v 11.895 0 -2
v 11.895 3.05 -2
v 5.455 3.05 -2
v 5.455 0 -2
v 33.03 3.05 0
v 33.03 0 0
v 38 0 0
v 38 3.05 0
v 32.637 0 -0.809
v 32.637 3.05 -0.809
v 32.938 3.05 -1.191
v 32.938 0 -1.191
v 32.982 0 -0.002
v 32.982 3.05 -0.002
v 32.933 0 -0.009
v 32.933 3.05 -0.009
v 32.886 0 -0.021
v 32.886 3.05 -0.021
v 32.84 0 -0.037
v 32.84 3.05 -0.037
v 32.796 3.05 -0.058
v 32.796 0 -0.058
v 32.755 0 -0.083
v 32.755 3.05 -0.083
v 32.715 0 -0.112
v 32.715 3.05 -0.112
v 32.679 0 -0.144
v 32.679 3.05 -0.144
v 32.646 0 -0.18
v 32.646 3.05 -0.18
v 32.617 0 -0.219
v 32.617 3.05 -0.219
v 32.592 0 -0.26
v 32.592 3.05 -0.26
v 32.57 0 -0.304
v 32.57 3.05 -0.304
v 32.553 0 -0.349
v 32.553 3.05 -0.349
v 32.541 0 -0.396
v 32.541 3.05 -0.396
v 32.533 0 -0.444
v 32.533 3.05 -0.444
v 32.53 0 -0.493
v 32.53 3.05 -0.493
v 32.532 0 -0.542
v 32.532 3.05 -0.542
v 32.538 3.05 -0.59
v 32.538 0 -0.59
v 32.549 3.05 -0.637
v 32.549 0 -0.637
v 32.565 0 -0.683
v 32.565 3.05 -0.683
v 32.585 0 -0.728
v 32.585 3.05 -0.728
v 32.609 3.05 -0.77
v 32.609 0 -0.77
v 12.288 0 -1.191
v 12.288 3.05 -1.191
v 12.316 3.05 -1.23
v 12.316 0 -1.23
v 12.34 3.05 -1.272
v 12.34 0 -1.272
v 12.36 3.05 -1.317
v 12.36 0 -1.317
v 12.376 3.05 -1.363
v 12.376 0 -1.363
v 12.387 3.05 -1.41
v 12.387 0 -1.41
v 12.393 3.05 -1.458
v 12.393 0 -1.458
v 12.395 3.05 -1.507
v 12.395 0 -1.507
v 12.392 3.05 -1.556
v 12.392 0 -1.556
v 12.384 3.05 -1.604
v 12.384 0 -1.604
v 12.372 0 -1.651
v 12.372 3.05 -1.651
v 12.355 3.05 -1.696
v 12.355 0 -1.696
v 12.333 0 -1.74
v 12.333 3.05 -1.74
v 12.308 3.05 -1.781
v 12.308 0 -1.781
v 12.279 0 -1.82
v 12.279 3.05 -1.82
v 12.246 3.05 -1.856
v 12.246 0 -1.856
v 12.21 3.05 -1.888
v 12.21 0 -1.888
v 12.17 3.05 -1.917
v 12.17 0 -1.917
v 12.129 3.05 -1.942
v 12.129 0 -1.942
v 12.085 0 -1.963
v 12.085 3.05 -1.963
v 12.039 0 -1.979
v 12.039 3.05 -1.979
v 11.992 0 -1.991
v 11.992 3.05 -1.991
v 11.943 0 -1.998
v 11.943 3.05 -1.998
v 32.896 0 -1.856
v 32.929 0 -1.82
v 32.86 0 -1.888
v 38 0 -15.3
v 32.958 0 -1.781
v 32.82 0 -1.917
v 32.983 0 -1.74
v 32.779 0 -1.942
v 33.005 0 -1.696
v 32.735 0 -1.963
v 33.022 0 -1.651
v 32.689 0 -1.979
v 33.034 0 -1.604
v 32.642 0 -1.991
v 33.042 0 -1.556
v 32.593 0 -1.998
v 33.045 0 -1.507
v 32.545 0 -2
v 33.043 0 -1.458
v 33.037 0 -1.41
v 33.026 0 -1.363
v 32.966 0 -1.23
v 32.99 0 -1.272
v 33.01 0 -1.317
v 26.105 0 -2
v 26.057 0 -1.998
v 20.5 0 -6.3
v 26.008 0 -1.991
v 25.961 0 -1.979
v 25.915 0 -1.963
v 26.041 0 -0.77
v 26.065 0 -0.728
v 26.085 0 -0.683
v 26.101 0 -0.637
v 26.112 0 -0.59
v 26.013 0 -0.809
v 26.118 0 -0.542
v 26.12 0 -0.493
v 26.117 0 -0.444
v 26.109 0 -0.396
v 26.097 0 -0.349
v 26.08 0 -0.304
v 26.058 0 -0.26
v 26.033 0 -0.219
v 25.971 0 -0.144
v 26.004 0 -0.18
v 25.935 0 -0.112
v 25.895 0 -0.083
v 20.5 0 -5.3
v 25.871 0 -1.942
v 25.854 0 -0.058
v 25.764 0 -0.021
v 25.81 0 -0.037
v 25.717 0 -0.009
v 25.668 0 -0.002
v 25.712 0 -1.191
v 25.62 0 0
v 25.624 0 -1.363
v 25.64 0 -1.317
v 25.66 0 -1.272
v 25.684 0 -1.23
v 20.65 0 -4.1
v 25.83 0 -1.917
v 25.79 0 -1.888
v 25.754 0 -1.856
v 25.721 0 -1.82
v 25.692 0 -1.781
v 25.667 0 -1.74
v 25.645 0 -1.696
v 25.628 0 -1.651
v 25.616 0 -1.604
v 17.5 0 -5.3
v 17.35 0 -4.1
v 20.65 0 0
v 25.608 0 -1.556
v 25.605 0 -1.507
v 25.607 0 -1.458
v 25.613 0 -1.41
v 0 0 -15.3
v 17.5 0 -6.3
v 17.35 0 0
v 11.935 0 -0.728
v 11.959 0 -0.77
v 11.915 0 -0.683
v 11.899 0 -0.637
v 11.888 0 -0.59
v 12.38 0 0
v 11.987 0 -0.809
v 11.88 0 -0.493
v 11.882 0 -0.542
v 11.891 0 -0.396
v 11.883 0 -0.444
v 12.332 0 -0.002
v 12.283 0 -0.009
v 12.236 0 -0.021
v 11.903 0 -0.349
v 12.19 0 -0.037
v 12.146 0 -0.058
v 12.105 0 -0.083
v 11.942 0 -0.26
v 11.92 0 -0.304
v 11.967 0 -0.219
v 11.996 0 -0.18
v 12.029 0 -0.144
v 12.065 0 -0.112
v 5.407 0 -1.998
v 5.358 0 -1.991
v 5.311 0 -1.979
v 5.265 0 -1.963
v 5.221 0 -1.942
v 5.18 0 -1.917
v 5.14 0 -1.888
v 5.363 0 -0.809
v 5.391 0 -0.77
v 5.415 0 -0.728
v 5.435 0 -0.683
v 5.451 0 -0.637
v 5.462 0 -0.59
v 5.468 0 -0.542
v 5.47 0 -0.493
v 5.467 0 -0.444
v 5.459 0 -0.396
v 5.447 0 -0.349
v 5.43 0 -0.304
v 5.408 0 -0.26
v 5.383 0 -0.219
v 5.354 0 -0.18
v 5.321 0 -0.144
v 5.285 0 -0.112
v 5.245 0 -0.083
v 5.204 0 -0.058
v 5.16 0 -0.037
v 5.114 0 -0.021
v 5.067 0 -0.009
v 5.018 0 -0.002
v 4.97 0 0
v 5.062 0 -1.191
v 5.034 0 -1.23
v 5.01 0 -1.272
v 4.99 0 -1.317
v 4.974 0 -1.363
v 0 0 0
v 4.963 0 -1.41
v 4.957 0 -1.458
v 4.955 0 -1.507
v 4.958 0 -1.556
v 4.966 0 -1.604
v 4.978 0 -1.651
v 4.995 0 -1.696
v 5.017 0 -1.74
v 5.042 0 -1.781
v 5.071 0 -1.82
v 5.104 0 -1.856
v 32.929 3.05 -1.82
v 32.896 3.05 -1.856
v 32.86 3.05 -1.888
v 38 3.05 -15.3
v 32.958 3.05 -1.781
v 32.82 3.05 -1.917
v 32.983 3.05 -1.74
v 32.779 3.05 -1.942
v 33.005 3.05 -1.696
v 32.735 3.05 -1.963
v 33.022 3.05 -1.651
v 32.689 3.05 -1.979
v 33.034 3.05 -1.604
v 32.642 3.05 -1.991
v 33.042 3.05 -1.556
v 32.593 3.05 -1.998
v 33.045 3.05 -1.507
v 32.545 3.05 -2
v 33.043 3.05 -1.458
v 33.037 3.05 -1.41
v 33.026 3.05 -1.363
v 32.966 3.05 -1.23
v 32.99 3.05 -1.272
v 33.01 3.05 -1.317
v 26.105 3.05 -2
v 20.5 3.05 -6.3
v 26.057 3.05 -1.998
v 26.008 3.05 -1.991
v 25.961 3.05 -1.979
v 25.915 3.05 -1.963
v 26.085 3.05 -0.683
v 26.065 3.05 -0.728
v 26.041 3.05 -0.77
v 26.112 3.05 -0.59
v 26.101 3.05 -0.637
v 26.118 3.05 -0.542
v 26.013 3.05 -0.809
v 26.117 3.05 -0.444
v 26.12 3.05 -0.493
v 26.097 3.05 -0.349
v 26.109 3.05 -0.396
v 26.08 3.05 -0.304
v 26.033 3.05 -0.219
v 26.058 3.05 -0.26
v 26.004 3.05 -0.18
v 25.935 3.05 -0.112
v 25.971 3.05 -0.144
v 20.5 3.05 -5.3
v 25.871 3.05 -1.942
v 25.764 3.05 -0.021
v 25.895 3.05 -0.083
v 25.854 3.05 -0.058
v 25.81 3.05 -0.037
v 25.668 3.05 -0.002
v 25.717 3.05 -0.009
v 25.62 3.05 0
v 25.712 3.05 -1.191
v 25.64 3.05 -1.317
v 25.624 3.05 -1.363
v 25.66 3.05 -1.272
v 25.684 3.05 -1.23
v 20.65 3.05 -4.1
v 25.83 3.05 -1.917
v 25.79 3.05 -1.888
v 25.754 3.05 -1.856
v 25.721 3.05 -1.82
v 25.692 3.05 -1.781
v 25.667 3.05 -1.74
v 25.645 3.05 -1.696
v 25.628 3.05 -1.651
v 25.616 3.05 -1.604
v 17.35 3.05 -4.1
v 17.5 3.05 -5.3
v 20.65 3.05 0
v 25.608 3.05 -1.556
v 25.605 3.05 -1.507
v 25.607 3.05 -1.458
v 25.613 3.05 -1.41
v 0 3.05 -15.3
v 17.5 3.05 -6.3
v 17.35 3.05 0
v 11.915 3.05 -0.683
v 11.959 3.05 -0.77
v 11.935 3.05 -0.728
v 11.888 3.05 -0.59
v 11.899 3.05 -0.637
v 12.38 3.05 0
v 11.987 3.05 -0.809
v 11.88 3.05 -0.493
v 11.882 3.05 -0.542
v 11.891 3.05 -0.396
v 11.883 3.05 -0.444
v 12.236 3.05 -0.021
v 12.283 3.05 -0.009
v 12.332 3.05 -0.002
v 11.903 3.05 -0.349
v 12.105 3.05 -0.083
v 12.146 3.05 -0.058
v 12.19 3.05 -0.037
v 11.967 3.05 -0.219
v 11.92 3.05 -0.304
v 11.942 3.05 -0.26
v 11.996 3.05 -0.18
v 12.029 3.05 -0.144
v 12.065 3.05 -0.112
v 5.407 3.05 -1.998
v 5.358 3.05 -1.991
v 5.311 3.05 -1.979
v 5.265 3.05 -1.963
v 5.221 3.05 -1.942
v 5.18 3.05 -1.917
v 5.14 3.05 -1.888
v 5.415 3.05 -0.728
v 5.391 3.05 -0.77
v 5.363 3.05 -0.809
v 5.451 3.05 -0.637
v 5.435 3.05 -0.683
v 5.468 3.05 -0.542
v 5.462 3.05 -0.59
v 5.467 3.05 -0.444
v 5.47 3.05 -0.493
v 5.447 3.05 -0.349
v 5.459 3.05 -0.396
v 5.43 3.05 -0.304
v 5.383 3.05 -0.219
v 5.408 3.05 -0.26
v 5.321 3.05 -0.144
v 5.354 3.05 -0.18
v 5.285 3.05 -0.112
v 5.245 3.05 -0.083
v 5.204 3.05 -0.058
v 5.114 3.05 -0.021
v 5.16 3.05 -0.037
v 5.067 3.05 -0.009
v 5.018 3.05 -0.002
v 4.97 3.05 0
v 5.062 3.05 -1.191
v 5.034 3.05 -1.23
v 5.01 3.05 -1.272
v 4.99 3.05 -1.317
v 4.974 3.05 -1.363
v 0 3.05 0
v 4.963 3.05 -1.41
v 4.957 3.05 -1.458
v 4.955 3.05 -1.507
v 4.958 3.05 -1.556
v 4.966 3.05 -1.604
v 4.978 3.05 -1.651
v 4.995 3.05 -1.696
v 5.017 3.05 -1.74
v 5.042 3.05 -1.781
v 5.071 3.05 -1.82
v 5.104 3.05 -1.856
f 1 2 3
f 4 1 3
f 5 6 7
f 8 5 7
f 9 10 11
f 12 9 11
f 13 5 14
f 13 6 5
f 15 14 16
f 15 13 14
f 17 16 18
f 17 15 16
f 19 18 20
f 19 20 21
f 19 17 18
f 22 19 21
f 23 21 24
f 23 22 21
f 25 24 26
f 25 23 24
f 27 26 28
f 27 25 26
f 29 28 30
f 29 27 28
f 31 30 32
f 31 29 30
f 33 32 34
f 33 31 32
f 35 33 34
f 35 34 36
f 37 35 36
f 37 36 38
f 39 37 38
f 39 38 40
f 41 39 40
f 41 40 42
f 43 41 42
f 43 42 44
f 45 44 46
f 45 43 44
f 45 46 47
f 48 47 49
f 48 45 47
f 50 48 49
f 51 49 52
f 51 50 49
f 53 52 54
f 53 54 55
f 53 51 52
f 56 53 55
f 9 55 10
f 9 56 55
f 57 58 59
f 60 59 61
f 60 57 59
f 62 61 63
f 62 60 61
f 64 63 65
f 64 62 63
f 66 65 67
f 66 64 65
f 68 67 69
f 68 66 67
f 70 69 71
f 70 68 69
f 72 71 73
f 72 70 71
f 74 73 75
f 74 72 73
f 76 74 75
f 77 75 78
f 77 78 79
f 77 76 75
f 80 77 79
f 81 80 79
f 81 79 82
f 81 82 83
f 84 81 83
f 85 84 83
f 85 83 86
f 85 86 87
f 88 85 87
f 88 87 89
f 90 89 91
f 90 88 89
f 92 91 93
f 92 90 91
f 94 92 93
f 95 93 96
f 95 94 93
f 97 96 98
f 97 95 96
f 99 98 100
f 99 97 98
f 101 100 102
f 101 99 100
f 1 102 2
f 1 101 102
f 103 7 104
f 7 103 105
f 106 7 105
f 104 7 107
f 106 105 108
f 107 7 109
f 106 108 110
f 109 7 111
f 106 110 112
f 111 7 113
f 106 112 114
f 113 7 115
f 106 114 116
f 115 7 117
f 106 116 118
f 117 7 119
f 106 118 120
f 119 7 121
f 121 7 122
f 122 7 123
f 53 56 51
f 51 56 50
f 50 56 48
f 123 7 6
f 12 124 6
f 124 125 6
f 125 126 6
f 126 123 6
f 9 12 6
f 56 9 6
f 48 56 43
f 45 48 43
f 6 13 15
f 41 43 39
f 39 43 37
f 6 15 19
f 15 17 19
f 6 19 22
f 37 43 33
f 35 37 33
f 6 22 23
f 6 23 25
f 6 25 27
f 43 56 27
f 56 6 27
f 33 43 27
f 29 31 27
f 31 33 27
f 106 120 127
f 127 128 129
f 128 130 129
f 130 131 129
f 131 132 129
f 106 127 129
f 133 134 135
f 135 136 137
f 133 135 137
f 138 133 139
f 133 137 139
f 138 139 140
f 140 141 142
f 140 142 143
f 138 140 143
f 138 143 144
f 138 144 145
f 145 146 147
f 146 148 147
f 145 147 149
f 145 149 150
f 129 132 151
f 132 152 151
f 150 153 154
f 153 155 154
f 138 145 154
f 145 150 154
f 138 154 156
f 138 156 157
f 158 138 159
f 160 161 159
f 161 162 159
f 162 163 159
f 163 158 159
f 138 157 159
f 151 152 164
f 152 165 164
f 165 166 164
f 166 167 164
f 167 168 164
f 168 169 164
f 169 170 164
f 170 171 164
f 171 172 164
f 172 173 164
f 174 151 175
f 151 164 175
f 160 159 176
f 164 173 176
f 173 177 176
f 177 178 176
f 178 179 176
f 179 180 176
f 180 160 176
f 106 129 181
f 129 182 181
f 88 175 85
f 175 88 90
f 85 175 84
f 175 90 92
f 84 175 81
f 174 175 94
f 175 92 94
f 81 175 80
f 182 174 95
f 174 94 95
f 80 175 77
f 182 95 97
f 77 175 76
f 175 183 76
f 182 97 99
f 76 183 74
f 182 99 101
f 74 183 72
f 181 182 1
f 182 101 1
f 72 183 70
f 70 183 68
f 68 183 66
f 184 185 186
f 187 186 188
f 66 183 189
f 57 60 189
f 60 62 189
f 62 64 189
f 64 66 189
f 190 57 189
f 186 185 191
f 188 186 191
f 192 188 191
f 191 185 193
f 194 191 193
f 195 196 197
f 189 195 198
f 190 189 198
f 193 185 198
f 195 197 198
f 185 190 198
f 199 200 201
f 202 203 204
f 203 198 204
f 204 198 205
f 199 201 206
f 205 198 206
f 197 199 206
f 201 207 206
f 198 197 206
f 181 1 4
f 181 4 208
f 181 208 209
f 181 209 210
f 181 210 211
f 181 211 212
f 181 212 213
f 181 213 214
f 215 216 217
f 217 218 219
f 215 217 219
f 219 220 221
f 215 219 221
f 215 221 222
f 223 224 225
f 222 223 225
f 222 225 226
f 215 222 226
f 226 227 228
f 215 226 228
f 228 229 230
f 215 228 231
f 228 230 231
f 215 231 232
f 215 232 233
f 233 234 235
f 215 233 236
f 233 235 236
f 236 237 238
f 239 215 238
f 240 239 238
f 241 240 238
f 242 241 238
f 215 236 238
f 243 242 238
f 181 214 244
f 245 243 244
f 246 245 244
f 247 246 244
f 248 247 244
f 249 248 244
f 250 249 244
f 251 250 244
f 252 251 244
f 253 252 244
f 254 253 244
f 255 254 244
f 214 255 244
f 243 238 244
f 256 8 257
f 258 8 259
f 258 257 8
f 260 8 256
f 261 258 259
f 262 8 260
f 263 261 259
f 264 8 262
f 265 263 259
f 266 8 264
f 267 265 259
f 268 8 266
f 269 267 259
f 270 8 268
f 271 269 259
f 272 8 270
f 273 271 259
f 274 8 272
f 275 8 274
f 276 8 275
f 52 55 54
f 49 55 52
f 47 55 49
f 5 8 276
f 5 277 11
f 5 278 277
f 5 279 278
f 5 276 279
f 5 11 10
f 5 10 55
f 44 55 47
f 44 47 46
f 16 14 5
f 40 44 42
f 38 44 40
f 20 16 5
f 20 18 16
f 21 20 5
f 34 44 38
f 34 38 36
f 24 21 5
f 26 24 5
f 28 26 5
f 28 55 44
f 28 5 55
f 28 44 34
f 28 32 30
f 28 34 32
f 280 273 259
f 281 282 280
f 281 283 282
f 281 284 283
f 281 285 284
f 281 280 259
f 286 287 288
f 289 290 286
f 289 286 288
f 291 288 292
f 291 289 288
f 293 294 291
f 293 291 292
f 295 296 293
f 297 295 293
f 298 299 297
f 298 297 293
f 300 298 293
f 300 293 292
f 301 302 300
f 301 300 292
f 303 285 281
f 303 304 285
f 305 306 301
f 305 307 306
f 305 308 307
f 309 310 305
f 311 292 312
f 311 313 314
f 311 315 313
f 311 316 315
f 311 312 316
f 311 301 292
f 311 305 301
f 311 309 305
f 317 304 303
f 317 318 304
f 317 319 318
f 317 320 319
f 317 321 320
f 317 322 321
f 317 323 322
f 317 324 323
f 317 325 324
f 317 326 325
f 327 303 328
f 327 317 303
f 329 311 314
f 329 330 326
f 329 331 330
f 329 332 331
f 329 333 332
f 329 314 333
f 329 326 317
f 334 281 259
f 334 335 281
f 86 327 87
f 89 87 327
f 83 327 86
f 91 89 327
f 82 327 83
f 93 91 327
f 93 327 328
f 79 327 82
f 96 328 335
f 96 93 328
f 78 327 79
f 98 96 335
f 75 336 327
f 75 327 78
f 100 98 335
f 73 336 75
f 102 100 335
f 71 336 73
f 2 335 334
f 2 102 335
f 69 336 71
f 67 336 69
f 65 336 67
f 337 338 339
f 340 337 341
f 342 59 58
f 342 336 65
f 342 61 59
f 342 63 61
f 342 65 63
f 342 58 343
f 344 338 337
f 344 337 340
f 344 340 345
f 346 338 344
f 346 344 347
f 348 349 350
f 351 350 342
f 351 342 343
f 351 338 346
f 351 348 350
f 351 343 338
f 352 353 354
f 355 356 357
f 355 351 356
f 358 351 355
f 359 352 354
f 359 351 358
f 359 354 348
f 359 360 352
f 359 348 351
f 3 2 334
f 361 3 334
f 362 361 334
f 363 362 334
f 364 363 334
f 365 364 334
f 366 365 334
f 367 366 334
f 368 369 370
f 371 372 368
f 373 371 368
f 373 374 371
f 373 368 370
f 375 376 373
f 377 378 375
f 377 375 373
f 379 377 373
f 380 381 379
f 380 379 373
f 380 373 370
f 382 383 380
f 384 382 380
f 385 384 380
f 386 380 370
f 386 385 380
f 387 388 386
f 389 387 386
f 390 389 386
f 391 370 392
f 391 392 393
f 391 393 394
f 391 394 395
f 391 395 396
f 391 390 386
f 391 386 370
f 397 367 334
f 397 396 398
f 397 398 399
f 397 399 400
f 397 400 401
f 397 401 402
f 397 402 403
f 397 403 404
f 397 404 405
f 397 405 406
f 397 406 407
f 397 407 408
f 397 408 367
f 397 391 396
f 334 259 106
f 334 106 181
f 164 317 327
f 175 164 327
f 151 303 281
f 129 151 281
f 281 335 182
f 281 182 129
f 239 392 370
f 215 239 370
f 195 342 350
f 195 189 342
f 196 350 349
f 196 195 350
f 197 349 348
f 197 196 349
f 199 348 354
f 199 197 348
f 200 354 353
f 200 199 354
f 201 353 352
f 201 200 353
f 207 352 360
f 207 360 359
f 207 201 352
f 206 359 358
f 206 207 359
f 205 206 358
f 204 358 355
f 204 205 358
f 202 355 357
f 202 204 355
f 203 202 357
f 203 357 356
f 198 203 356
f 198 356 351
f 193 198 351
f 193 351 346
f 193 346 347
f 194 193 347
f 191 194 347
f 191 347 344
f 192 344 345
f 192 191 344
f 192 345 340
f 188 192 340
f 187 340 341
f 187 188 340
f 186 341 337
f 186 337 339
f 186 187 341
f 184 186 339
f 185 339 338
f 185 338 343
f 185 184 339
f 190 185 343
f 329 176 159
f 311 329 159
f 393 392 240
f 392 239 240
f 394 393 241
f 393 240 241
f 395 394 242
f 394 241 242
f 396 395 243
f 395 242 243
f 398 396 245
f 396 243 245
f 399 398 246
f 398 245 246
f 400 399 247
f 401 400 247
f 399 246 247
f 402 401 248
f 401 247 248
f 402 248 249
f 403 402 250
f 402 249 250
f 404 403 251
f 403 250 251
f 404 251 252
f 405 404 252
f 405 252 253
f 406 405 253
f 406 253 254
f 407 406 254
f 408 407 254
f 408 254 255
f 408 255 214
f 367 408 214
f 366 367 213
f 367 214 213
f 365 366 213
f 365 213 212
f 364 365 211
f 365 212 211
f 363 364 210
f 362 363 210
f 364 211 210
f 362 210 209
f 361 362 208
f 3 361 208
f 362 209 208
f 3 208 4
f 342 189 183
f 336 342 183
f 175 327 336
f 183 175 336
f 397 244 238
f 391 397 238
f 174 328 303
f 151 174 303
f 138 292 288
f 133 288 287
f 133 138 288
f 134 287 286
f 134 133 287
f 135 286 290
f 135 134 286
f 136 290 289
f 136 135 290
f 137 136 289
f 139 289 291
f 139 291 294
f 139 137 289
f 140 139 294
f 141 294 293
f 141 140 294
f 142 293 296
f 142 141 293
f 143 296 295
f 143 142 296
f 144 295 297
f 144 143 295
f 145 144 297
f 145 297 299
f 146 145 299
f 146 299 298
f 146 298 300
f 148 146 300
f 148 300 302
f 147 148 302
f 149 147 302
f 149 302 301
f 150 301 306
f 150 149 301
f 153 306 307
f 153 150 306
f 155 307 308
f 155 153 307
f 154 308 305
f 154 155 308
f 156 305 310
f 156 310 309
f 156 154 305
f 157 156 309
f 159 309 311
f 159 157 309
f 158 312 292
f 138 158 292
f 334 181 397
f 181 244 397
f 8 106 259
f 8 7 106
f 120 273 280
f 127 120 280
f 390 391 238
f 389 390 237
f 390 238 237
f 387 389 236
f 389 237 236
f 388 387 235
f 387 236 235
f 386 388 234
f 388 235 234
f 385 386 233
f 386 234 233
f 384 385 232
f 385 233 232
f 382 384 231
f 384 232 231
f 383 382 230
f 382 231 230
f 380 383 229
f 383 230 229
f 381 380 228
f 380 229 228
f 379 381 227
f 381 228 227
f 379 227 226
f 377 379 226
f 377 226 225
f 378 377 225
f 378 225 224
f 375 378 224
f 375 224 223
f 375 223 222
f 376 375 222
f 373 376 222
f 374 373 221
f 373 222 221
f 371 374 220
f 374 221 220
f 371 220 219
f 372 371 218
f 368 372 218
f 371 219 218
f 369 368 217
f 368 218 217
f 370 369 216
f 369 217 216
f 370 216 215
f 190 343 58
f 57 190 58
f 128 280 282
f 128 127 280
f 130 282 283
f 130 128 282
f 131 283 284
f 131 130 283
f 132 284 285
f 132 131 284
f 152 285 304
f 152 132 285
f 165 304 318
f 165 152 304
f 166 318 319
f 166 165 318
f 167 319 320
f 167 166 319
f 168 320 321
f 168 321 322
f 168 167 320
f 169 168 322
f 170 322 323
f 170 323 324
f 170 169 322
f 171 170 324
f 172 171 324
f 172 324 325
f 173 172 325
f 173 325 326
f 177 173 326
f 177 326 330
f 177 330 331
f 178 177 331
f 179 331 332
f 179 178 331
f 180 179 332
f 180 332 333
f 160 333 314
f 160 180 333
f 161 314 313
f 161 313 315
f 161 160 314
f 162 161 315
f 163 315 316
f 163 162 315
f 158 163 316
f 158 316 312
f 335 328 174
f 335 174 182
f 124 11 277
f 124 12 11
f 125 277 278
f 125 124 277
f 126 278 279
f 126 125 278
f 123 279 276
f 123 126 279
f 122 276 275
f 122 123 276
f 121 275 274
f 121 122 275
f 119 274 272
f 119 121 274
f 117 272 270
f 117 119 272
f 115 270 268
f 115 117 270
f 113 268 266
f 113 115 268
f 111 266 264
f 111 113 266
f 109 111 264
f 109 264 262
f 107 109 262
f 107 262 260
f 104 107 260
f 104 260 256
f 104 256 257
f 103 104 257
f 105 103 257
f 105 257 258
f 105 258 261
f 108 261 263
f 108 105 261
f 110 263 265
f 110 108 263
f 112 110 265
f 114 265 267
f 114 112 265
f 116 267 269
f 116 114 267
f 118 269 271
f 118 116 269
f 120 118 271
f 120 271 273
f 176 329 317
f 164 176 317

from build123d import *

# Parameters (mm, degrees)
SKETCH1_W           = 38
SKETCH1_H           = 8.3
BOSS_EXTRUDE1_DEPTH = 3.05
SKETCH3_W           = 3
SKETCH3_H           = 1
CUT_EXTRUDE2_DEPTH  = 40.015285466
CUT_EXTRUDE1_DEPTH  = 40.015285466
FILLET1_R           = 0.5
SKETCH4_W           = 38
SKETCH4_H           = 3.05
BOSS_EXTRUDE2_DEPTH = 7


with BuildPart() as part:
    # Sketch1 → Boss-Extrude1 (new body)
    with BuildSketch(Plane(origin=(0, 0, 0), x_dir=(1, 0, 0), z_dir=(0, 1, 0))):
        with Locations((19, 4.15)):
            Rectangle(SKETCH1_W, SKETCH1_H)
    extrude(amount=BOSS_EXTRUDE1_DEPTH)

    # Sketch3 → Cut-Extrude2 (cut, through all)
    with BuildSketch(Plane(origin=(0, 3.05, 0), x_dir=(1, 0, 0), z_dir=(0, 1, 0))):
        Polygon((20.65, 4.1), (19, 4.1), (17.35, 4.1), (17.35, 0), (20.65, 0), align=None)
        with Locations((19, 5.8)):
            Rectangle(SKETCH3_W, SKETCH3_H)
    extrude(amount=-CUT_EXTRUDE2_DEPTH, mode=Mode.SUBTRACT)

    # Sketch2 → Cut-Extrude1 (cut, through all)
    with BuildSketch(Plane(origin=(0, 3.05, 0), x_dir=(1, 0, 0), z_dir=(0, 1, 0))):
        Polygon((4.425, 2), (6, 0), (11.35, 0), (12.925, 2), align=None)
        Polygon((33.575, 2), (25.075, 2), (26.65, 0), (32, 0), align=None)
    extrude(amount=-CUT_EXTRUDE1_DEPTH, mode=Mode.SUBTRACT)

    # Fillet1
    fillet1_edges = [part.edges().sort_by_distance(p)[0] for p in [
        (12.925, 1.525, -2),
        (11.35, 1.525, 0),
        (6, 1.525, 0),
        (4.425, 1.525, -2),
        (33.575, 1.525, -2),
        (32, 1.525, 0),
        (26.65, 1.525, 0),
        (25.075, 1.525, -2),
    ]]
    fillet(fillet1_edges, radius=FILLET1_R)

    # Sketch4 → Boss-Extrude2 (add)
    with BuildSketch(Plane(origin=(0, 0, -8.3), x_dir=(-1, 0, 0), z_dir=(0, 0, -1))):
        with Locations((-19, 1.525)):
            Rectangle(SKETCH4_W, SKETCH4_H)
    extrude(amount=BOSS_EXTRUDE2_DEPTH)


solid = part.part
